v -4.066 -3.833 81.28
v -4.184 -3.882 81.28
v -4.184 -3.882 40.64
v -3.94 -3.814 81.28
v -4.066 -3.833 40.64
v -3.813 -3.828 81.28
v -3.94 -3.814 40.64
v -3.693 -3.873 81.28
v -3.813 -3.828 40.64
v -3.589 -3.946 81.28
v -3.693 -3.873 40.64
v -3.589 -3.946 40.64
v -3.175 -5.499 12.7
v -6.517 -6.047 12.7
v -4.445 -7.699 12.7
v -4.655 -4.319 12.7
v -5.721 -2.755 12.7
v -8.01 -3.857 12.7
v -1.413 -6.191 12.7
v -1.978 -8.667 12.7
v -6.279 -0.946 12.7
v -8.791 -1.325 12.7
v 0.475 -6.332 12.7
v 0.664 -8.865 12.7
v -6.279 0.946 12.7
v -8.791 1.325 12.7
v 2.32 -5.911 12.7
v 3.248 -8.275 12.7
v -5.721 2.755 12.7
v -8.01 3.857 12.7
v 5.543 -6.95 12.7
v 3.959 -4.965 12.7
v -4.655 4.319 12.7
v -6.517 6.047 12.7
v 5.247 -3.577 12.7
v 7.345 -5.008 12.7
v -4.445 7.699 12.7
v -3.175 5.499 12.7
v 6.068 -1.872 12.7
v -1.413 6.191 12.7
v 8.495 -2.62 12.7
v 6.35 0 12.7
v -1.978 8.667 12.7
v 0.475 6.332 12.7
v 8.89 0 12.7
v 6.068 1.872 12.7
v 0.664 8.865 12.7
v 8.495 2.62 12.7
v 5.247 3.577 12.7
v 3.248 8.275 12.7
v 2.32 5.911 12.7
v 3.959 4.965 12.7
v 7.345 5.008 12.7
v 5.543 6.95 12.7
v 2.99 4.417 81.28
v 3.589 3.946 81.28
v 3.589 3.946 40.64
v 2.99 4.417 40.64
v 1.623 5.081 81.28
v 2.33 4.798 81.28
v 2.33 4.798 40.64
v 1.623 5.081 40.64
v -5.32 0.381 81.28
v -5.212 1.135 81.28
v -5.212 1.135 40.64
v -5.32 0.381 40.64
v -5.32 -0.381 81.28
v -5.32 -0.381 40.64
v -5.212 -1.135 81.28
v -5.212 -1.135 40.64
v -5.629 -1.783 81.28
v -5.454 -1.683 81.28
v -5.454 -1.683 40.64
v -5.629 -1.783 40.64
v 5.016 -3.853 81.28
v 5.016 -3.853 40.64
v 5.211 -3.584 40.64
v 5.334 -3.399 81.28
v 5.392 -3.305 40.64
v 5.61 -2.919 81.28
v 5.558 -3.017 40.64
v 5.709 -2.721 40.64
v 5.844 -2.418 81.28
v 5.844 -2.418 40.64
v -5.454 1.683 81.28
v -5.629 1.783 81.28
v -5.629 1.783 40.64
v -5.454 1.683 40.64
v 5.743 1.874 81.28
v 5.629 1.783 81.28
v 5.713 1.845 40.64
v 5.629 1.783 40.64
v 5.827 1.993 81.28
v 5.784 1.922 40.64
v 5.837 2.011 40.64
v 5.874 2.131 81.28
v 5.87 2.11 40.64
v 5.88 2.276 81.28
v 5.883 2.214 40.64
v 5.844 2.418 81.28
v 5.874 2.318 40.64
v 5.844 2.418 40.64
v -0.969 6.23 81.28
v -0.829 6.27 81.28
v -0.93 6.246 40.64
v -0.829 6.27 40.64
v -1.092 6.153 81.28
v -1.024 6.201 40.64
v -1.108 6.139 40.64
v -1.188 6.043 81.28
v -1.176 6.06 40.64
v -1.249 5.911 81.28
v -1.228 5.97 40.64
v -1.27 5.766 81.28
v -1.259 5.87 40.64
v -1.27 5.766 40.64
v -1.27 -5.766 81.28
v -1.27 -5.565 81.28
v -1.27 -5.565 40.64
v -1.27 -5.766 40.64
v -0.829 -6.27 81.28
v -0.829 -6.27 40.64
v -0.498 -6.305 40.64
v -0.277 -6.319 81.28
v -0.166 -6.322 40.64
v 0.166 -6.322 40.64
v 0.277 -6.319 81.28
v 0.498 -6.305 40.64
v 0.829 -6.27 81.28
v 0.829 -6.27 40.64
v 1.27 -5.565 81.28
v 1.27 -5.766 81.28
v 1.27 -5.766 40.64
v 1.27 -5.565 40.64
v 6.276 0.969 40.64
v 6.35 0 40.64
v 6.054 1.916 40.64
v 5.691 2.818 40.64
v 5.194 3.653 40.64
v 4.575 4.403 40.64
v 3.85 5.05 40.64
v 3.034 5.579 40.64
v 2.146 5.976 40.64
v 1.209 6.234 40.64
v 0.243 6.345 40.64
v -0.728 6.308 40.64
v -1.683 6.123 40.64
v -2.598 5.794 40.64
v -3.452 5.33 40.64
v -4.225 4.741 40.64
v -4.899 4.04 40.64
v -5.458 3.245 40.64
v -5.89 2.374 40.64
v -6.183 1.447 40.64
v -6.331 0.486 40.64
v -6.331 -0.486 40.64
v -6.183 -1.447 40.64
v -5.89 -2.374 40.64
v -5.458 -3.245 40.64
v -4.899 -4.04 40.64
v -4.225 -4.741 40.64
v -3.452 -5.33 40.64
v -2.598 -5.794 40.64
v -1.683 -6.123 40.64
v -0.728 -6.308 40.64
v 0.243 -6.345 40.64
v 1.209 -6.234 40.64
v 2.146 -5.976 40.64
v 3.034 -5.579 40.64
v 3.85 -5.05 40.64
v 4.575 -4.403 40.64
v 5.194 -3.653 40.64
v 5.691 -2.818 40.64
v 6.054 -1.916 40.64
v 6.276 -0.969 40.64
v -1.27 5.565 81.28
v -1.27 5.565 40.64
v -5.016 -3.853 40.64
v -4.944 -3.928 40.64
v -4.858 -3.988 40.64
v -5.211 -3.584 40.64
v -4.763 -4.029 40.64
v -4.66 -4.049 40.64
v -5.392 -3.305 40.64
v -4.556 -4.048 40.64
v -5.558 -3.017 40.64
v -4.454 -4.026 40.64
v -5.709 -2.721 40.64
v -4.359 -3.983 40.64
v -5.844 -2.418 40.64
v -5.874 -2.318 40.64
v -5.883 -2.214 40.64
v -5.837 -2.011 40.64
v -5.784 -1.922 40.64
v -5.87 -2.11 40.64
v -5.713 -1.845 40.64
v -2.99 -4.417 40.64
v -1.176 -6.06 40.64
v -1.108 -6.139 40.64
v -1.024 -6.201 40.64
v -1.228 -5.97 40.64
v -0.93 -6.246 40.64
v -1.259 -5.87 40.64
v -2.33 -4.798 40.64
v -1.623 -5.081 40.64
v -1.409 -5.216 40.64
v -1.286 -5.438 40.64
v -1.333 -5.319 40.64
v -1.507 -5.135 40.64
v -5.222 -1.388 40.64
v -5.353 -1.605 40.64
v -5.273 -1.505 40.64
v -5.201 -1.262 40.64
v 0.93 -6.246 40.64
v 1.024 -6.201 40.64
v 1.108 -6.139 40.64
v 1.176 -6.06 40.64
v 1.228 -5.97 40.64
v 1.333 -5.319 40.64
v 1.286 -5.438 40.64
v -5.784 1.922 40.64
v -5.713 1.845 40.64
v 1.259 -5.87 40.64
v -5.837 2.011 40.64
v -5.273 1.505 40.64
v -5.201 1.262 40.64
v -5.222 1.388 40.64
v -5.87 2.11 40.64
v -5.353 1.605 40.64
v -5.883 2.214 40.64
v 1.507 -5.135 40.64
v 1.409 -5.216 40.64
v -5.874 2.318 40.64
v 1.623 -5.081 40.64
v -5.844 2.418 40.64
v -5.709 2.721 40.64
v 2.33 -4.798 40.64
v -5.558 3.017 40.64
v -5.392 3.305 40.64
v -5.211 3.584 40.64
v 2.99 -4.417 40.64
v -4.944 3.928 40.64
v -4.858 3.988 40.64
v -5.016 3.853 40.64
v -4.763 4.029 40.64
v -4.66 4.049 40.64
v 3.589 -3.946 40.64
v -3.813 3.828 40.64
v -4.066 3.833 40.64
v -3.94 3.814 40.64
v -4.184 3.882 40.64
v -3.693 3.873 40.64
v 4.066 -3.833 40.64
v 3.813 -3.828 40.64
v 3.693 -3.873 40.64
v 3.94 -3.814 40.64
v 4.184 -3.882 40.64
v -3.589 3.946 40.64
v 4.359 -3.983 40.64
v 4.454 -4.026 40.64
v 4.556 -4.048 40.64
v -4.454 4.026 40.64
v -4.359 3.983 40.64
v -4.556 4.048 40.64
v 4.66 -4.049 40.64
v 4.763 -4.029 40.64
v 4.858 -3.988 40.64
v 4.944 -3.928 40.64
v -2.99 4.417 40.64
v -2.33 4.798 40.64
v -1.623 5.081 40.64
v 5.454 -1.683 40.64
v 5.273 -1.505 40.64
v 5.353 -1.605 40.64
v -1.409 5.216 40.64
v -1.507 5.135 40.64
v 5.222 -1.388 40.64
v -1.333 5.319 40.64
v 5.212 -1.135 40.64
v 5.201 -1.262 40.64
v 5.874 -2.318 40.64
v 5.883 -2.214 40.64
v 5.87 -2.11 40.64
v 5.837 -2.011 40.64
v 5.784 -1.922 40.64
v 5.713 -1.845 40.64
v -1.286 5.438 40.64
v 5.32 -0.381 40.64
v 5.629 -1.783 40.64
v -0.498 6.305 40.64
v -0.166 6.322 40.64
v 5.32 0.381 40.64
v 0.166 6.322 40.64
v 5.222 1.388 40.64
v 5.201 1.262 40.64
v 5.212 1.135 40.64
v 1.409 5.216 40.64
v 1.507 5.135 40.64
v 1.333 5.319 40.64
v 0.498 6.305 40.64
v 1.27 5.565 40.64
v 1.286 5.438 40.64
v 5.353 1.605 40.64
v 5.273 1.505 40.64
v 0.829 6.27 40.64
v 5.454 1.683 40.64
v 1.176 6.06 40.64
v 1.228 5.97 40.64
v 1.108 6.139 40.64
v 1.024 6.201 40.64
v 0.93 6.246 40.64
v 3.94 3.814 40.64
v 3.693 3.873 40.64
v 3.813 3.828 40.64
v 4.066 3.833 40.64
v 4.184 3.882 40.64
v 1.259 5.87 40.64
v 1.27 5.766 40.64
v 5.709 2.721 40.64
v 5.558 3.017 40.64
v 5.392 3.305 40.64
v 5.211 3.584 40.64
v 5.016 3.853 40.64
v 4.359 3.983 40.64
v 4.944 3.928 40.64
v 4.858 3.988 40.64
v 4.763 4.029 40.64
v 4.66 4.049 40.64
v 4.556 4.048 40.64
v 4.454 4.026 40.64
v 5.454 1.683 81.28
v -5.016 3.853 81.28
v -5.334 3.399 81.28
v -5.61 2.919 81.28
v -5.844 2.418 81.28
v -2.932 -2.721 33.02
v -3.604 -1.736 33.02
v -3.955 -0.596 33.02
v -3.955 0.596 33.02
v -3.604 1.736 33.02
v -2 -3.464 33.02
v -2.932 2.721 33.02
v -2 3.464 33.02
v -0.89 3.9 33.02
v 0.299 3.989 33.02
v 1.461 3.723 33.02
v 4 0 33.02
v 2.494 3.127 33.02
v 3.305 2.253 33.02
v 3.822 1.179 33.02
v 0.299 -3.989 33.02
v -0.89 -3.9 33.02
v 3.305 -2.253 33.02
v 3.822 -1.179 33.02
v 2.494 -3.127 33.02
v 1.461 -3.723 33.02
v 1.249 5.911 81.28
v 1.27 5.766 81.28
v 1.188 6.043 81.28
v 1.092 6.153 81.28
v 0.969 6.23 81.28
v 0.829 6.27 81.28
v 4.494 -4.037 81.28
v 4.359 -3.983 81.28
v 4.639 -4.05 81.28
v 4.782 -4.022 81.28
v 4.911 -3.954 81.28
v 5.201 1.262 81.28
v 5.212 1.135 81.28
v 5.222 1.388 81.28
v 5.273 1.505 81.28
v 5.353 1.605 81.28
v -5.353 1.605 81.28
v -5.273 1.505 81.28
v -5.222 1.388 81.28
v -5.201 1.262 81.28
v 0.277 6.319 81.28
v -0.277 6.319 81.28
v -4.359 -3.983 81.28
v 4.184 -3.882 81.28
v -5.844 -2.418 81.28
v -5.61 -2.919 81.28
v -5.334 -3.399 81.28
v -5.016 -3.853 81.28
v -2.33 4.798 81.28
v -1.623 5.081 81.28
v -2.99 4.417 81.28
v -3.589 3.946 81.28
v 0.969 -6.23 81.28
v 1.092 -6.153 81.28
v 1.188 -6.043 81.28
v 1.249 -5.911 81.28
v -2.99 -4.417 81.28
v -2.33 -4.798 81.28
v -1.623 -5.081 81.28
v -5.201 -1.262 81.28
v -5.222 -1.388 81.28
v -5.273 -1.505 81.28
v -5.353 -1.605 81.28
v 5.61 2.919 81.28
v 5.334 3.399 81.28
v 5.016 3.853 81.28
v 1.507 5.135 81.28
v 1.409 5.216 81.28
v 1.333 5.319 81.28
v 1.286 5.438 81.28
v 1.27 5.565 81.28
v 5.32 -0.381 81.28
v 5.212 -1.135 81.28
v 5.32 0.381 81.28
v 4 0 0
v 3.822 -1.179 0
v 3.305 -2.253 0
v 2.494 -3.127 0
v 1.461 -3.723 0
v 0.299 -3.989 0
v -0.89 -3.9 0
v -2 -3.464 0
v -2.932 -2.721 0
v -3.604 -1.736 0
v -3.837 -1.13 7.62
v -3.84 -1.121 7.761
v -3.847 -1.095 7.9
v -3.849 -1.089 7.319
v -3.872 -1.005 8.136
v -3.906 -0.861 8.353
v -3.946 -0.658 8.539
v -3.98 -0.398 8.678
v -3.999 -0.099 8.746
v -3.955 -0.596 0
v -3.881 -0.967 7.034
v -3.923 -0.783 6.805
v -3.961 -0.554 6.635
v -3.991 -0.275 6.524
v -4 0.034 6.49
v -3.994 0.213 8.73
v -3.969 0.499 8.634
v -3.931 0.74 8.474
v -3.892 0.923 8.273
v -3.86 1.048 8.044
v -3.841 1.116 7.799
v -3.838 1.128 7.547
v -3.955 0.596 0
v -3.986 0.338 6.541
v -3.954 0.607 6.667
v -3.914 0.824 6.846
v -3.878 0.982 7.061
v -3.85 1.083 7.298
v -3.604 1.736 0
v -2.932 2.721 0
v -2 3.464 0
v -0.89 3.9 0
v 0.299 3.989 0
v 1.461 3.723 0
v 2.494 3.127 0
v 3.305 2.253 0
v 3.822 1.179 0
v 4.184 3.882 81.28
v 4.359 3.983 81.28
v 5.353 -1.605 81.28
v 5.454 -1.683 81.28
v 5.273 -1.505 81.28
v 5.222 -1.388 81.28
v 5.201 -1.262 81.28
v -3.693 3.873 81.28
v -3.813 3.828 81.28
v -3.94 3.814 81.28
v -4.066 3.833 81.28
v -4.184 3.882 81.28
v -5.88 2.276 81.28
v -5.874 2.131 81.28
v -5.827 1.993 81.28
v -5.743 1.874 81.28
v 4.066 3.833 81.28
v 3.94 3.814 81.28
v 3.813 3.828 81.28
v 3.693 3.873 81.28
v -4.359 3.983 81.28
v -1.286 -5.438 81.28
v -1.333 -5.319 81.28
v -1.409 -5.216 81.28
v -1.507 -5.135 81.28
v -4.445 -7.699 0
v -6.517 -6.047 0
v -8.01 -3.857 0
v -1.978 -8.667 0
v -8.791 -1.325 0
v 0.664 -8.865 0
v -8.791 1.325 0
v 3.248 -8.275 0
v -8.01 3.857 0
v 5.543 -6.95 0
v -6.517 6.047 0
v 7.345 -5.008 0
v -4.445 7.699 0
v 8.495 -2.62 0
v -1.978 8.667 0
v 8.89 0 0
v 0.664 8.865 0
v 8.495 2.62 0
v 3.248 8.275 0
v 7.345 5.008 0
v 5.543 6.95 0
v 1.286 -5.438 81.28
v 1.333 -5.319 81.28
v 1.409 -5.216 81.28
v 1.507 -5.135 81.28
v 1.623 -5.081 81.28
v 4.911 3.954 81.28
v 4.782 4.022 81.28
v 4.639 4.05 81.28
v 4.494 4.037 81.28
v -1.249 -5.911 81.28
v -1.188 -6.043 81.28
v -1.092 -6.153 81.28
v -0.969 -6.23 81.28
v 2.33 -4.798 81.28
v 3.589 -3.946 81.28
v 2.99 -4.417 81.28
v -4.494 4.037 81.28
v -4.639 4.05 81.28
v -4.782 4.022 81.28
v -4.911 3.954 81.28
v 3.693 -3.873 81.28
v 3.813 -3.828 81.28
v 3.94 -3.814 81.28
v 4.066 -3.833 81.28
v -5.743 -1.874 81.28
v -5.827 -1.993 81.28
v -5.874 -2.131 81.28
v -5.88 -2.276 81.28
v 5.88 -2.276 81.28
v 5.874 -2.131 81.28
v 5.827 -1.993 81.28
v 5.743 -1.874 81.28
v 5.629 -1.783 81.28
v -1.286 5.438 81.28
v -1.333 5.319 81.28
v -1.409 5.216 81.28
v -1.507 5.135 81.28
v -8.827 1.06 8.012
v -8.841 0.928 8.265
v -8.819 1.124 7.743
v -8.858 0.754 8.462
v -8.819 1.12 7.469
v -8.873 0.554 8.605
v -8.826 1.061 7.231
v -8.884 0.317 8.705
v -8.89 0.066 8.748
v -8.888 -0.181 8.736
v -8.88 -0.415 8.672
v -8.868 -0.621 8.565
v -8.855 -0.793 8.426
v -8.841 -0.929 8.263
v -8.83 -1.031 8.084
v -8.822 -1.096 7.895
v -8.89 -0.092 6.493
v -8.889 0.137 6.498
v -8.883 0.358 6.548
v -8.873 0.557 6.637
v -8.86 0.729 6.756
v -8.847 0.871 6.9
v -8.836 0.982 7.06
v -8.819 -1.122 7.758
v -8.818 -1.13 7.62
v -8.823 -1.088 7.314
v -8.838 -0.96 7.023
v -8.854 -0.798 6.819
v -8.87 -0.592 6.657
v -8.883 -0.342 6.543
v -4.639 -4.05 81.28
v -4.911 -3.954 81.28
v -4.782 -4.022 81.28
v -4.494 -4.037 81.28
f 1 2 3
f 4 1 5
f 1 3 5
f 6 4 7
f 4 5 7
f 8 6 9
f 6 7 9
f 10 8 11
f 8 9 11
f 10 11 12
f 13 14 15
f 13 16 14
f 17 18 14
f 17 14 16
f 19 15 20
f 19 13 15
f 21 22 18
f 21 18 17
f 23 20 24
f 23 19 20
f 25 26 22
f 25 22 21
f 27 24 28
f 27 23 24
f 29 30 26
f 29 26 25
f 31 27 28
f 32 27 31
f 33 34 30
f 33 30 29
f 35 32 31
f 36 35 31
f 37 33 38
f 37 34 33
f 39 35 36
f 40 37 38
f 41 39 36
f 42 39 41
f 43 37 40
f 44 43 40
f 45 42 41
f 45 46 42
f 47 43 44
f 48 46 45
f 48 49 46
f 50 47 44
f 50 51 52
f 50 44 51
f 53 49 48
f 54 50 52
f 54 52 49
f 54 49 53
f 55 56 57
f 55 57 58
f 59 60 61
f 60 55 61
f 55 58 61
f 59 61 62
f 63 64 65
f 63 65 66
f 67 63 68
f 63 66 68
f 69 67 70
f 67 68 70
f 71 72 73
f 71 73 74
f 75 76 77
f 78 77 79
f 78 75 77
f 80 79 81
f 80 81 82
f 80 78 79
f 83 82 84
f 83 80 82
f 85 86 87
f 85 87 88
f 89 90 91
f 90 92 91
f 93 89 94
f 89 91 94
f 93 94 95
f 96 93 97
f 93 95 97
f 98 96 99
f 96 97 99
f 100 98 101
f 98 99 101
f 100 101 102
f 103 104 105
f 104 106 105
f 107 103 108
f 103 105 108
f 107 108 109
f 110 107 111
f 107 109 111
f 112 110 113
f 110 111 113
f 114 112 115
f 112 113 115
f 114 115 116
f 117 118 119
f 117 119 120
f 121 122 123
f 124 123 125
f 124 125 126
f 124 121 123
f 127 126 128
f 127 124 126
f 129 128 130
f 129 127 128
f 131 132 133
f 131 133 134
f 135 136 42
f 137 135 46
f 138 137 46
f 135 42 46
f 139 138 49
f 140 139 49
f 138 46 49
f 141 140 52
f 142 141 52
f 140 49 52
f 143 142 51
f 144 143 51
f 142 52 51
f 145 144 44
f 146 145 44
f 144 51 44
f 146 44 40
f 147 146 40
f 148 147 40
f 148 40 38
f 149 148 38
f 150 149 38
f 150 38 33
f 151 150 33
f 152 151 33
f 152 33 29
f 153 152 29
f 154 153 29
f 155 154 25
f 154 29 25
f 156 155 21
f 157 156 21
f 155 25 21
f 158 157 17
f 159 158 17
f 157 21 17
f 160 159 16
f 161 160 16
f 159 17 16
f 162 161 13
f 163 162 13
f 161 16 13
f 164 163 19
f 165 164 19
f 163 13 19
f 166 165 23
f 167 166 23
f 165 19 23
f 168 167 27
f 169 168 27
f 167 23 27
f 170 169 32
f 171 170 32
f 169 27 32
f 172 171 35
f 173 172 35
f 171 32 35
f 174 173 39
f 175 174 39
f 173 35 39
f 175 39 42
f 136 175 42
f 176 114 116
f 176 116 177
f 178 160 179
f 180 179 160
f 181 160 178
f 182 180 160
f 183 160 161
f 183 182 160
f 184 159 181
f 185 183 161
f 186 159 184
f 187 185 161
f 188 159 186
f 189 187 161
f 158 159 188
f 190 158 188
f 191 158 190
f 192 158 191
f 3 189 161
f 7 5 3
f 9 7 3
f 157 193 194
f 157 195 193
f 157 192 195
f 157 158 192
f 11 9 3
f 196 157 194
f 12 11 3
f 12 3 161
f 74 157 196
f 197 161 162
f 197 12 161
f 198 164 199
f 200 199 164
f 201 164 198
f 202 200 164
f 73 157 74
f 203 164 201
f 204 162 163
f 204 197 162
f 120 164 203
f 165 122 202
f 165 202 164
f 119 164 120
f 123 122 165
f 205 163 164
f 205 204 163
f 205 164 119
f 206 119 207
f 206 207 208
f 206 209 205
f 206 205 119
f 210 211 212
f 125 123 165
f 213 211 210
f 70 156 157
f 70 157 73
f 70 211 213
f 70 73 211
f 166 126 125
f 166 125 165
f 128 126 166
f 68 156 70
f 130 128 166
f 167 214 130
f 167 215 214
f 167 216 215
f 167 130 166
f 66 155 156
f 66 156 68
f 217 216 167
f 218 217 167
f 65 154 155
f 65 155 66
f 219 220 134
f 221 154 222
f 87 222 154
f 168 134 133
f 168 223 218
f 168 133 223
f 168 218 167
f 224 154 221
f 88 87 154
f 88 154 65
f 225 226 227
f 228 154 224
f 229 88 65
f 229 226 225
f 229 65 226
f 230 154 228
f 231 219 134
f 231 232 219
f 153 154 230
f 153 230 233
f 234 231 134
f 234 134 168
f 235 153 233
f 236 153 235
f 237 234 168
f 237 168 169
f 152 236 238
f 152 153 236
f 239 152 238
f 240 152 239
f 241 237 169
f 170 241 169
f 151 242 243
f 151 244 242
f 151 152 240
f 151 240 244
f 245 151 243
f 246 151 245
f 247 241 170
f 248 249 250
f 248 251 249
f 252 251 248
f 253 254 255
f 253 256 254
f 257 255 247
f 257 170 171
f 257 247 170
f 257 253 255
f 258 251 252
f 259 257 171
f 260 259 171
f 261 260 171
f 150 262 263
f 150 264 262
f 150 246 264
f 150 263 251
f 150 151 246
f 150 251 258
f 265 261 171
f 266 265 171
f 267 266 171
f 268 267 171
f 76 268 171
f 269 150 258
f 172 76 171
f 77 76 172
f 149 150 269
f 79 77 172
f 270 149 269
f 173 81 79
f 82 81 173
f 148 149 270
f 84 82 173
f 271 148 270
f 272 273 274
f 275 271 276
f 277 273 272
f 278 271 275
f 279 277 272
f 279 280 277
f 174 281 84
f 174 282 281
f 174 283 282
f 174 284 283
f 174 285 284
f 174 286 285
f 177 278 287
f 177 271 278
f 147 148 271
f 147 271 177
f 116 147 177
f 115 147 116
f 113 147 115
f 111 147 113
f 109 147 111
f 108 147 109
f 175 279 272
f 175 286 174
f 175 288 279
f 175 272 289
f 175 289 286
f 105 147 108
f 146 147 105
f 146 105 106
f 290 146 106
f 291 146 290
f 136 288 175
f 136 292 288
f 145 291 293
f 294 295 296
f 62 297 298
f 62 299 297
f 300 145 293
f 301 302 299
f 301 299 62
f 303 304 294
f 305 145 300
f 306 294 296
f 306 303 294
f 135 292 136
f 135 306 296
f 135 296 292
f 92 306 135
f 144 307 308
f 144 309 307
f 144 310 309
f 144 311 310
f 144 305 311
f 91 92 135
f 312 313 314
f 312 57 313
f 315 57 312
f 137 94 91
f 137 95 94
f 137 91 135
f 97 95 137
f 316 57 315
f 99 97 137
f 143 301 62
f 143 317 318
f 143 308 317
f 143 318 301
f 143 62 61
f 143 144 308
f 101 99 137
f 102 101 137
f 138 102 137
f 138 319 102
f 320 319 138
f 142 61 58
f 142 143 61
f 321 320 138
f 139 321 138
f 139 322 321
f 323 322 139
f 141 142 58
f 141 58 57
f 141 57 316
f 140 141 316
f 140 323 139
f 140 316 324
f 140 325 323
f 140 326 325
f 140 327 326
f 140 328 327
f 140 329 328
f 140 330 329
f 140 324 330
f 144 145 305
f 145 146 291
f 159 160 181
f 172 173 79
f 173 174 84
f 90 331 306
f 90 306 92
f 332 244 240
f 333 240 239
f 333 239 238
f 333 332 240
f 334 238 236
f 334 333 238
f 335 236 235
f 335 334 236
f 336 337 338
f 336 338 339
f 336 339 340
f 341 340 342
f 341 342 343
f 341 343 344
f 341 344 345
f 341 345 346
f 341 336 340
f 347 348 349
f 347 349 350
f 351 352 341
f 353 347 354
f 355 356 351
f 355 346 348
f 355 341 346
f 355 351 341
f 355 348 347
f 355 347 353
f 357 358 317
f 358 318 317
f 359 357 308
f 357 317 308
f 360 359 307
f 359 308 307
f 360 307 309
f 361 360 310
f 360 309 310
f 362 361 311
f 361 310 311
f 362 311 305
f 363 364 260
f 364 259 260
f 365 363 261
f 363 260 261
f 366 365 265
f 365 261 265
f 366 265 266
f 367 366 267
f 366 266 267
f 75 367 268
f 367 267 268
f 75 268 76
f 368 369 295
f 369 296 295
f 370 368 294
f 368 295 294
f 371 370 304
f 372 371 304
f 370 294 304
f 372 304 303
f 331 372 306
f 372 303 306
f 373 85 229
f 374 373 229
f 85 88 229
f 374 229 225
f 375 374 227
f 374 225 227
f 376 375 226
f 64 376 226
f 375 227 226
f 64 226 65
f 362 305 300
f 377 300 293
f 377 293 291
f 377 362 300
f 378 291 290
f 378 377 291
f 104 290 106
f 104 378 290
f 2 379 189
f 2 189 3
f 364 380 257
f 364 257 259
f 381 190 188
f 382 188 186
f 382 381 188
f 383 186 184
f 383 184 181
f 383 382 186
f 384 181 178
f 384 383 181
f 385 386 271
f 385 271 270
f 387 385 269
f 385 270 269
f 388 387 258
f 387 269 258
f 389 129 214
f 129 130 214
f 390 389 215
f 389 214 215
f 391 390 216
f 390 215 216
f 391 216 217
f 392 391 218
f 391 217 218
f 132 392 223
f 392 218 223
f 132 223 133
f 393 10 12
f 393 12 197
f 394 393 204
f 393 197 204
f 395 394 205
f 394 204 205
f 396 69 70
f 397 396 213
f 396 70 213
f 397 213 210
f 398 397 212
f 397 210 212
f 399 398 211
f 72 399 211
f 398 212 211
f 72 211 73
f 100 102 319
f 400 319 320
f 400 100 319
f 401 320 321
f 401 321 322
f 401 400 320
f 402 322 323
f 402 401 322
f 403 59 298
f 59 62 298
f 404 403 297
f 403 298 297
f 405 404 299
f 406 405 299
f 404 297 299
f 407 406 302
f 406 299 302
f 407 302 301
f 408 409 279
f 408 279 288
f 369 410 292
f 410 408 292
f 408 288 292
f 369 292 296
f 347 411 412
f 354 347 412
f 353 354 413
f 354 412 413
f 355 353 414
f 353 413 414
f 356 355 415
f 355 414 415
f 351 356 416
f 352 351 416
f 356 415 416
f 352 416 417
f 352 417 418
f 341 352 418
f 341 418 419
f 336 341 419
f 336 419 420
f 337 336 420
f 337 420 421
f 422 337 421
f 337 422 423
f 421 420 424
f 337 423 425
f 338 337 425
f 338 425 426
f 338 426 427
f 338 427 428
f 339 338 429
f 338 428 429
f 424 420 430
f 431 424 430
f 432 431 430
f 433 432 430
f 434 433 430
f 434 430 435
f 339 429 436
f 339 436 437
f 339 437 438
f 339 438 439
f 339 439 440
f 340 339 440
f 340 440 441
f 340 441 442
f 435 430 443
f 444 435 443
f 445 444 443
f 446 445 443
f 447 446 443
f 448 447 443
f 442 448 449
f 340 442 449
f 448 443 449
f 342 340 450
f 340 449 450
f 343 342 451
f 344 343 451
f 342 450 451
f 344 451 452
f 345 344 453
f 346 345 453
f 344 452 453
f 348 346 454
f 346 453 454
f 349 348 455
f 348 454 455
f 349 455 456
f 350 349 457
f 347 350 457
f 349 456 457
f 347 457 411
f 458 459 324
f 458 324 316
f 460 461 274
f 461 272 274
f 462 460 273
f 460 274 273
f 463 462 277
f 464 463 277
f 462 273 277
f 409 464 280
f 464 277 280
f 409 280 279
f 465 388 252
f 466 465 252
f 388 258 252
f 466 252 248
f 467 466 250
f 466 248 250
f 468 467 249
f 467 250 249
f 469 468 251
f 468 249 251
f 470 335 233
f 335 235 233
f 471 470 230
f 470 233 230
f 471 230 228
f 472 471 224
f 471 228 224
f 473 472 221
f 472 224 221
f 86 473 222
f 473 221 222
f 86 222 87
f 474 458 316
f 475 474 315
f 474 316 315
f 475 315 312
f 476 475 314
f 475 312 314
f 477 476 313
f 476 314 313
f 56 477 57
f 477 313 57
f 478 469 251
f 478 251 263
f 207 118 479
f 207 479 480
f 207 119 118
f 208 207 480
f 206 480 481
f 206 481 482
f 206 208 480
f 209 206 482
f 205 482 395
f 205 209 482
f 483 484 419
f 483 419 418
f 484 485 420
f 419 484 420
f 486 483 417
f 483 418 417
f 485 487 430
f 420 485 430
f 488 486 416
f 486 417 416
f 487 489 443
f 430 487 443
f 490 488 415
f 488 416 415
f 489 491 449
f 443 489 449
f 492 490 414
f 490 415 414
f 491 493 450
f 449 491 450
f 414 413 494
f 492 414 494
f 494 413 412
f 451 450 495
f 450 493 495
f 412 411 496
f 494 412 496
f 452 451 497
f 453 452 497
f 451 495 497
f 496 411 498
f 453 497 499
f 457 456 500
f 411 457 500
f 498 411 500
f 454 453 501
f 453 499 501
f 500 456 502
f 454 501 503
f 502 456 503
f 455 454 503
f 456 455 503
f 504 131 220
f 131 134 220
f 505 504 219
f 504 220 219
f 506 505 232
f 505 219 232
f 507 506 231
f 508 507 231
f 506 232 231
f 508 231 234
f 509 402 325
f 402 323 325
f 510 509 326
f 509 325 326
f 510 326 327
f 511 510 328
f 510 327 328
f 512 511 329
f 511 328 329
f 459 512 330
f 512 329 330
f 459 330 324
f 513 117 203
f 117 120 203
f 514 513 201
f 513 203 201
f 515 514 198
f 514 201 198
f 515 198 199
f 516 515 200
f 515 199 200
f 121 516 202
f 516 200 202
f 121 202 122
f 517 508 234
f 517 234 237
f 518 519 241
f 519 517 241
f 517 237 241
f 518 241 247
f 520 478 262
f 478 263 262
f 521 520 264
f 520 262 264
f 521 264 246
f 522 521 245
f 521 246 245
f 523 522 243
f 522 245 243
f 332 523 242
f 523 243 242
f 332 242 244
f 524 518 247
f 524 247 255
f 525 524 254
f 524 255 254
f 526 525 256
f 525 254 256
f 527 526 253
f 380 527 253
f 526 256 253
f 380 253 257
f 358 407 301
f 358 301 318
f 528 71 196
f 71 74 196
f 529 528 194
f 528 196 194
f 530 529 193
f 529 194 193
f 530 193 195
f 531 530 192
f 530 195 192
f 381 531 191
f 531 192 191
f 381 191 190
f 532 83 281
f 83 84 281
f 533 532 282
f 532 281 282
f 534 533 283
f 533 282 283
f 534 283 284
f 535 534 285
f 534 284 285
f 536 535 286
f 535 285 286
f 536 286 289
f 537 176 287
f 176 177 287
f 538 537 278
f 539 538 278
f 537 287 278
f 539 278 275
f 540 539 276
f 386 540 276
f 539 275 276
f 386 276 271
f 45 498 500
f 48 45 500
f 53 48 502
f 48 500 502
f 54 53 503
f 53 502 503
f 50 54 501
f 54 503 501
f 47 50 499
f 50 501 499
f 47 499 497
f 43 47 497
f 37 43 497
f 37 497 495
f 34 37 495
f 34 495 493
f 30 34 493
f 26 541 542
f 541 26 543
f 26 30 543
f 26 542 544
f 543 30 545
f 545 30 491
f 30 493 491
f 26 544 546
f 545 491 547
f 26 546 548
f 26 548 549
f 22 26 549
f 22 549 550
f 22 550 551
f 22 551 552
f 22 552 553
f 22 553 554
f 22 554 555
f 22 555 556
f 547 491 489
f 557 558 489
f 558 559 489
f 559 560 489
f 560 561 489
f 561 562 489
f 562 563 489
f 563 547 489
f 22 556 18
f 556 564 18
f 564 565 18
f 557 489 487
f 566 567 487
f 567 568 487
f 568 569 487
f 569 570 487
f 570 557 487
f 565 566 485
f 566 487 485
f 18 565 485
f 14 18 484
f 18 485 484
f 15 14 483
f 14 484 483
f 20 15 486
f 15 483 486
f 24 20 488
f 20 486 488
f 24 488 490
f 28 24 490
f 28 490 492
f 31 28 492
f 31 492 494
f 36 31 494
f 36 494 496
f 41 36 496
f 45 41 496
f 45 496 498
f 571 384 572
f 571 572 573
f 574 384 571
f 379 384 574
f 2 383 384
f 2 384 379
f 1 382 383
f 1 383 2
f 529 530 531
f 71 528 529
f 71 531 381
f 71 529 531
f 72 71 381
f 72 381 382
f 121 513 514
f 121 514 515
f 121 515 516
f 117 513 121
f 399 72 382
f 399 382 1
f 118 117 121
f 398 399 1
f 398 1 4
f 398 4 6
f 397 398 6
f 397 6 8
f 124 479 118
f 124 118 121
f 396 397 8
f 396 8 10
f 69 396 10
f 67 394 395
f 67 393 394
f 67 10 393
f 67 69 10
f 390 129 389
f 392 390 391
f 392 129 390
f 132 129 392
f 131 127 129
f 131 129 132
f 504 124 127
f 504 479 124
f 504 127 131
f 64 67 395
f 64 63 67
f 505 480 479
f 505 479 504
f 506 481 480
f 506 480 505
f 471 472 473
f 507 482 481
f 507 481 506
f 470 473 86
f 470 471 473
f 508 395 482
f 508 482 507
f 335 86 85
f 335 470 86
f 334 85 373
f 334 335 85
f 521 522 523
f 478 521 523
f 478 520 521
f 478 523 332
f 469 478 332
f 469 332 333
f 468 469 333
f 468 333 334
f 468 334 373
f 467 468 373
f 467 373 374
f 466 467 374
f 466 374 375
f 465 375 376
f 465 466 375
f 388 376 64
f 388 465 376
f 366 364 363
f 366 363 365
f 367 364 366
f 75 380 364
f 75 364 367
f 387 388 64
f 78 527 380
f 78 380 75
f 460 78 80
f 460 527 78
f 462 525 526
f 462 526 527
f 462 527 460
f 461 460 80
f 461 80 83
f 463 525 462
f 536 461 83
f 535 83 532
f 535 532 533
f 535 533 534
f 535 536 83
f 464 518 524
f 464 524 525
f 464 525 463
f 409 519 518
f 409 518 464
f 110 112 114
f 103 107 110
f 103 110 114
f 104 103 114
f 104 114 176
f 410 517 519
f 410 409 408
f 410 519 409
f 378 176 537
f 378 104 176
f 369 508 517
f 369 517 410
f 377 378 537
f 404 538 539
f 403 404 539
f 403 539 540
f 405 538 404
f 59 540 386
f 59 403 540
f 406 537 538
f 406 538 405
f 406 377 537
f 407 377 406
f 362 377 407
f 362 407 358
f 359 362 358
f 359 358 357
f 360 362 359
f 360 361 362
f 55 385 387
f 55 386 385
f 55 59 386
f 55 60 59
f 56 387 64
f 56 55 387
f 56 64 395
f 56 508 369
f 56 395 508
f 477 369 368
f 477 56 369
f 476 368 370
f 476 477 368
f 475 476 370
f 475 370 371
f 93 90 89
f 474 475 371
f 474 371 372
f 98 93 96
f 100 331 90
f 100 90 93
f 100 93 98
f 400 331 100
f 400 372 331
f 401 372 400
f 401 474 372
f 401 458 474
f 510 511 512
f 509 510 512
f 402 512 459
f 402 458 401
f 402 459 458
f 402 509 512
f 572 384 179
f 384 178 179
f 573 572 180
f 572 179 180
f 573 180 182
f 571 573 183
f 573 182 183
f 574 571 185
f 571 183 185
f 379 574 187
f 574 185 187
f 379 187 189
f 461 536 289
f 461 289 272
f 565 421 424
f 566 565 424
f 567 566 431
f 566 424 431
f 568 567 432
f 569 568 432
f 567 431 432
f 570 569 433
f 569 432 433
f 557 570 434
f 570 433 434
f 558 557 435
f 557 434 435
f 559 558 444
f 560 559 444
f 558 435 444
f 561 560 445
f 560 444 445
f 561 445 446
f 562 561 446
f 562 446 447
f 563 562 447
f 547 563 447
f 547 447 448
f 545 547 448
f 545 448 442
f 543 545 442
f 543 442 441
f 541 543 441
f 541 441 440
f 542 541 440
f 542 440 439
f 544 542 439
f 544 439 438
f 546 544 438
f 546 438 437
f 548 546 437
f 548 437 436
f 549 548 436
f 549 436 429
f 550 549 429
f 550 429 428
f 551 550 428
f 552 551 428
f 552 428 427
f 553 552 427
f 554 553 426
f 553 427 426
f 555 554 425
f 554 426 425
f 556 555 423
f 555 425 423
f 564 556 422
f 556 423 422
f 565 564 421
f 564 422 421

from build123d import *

# Parameters (mm, degrees)
F0_R            = 8.89
F1_DEPTH        = 12.7
F2_R            = 6.35
F3_DEPTH        = 27.94
F4_R            = 5.334
F5_DEPTH        = 40.64
F7_DEPTH        = 40.64
F7_COPIES_COUNT = 6
F8_R            = 0.508
F9_R            = 4
F10_DEPTH       = 33.02
F14_D           = 2.2606
F14_DEPTH       = 8.89
F14_START       = 0.0721476
F14_TIP         = 0.6791527577


# Not quite as in the source:
# - a pattern or mirror of a feature is missing from the dataset's text; its kind, count and spacing are read off the source's solid


with BuildPart() as f1:
    # F0 (on Top) → F1 (new body)
    with BuildSketch(Plane.XY):
        Circle(F0_R)
    extrude(amount=F1_DEPTH)

    # F2 (on face) → F3 (join)
    with BuildSketch(Plane.XY.offset(12.7)):
        Circle(F2_R)
    extrude(amount=F3_DEPTH)

    # F4 (on face) → F5 (join)
    with BuildSketch(Plane.XY.offset(40.64)):
        Circle(F4_R)
    extrude(amount=F5_DEPTH)

    # F6 (on face) → F7 (join, through all)
    with BuildSketch(Plane.XY.offset(81.28)):
        with BuildLine():
            Line((-1.27, -5.1806038258), (-1.27, -6.1957780109))
            ThreePointArc((-1.27, -6.1957780109), (0, -6.3246), (1.27, -6.1957780109))
            Line((1.27, -6.1957780109), (1.27, -5.1806038258))
            ThreePointArc((1.27, -5.1806038258), (0, -5.334), (-1.27, -5.1806038258))
        make_face()
    f7 = extrude(amount=-F7_DEPTH)

    # F7_copies: F7 ×6 about axis
    f7_copies_axis = Axis((0, 0, 0), (0, 0, 1))
    for i in range(1, F7_COPIES_COUNT):
        add(f7.rotate(f7_copies_axis, i * 360 / F7_COPIES_COUNT))

    # F8
    f8_edges = [f1.edges().sort_by_distance(p)[0] for p in [
        (1.27, -6.195778, 60.96),
        (1.27, -5.180604, 60.96),
        (-1.27, -6.195778, 60.96),
        (-1.27, -5.180604, 60.96),
        (3.851535, -3.690154, 60.96),
        (4.730701, -4.197741, 60.96),
        (6.000701, -1.998037, 60.96),
        (5.121535, -1.49045, 60.96),
        (5.121535, 1.49045, 60.96),
        (6.000701, 1.998037, 60.96),
        (4.730701, 4.197741, 60.96),
        (3.851535, 3.690154, 60.96),
        (1.27, 5.180604, 60.96),
        (1.27, 6.195778, 60.96),
        (-1.27, 6.195778, 60.96),
        (-1.27, 5.180604, 60.96),
        (-3.851535, 3.690154, 60.96),
        (-4.730701, 4.197741, 60.96),
        (-6.000701, 1.998037, 60.96),
        (-5.121535, 1.49045, 60.96),
        (-5.121535, -1.49045, 60.96),
        (-6.000701, -1.998037, 60.96),
        (-4.730701, -4.197741, 60.96),
        (-3.851535, -3.690154, 60.96),
    ]]
    fillet(f8_edges, radius=F8_R)

    # F9 (on face) → F10 (cut)
    with BuildSketch(Plane(origin=(0, 0, 0), x_dir=(1, 0, 0), z_dir=(0, 0, -1))):
        Circle(F9_R)
    extrude(amount=-F10_DEPTH, mode=Mode.SUBTRACT)

    # F14
    # its depths count from where the whole tool has entered the part; down to there all is cleared
    with Locations(Plane(origin=(-8.89, 0, 0), x_dir=(0, 1, 0), z_dir=(-1, 0, 0)).offset(-F14_START)):
        with Locations((0, -7.62)):
            Hole(F14_D / 2, depth=F14_DEPTH)
            with Locations((0, 0, -(F14_DEPTH + F14_TIP / 2))):  # 118° drill point
                Cone(0, F14_D / 2, F14_TIP, mode=Mode.SUBTRACT)


solid = f1.part
